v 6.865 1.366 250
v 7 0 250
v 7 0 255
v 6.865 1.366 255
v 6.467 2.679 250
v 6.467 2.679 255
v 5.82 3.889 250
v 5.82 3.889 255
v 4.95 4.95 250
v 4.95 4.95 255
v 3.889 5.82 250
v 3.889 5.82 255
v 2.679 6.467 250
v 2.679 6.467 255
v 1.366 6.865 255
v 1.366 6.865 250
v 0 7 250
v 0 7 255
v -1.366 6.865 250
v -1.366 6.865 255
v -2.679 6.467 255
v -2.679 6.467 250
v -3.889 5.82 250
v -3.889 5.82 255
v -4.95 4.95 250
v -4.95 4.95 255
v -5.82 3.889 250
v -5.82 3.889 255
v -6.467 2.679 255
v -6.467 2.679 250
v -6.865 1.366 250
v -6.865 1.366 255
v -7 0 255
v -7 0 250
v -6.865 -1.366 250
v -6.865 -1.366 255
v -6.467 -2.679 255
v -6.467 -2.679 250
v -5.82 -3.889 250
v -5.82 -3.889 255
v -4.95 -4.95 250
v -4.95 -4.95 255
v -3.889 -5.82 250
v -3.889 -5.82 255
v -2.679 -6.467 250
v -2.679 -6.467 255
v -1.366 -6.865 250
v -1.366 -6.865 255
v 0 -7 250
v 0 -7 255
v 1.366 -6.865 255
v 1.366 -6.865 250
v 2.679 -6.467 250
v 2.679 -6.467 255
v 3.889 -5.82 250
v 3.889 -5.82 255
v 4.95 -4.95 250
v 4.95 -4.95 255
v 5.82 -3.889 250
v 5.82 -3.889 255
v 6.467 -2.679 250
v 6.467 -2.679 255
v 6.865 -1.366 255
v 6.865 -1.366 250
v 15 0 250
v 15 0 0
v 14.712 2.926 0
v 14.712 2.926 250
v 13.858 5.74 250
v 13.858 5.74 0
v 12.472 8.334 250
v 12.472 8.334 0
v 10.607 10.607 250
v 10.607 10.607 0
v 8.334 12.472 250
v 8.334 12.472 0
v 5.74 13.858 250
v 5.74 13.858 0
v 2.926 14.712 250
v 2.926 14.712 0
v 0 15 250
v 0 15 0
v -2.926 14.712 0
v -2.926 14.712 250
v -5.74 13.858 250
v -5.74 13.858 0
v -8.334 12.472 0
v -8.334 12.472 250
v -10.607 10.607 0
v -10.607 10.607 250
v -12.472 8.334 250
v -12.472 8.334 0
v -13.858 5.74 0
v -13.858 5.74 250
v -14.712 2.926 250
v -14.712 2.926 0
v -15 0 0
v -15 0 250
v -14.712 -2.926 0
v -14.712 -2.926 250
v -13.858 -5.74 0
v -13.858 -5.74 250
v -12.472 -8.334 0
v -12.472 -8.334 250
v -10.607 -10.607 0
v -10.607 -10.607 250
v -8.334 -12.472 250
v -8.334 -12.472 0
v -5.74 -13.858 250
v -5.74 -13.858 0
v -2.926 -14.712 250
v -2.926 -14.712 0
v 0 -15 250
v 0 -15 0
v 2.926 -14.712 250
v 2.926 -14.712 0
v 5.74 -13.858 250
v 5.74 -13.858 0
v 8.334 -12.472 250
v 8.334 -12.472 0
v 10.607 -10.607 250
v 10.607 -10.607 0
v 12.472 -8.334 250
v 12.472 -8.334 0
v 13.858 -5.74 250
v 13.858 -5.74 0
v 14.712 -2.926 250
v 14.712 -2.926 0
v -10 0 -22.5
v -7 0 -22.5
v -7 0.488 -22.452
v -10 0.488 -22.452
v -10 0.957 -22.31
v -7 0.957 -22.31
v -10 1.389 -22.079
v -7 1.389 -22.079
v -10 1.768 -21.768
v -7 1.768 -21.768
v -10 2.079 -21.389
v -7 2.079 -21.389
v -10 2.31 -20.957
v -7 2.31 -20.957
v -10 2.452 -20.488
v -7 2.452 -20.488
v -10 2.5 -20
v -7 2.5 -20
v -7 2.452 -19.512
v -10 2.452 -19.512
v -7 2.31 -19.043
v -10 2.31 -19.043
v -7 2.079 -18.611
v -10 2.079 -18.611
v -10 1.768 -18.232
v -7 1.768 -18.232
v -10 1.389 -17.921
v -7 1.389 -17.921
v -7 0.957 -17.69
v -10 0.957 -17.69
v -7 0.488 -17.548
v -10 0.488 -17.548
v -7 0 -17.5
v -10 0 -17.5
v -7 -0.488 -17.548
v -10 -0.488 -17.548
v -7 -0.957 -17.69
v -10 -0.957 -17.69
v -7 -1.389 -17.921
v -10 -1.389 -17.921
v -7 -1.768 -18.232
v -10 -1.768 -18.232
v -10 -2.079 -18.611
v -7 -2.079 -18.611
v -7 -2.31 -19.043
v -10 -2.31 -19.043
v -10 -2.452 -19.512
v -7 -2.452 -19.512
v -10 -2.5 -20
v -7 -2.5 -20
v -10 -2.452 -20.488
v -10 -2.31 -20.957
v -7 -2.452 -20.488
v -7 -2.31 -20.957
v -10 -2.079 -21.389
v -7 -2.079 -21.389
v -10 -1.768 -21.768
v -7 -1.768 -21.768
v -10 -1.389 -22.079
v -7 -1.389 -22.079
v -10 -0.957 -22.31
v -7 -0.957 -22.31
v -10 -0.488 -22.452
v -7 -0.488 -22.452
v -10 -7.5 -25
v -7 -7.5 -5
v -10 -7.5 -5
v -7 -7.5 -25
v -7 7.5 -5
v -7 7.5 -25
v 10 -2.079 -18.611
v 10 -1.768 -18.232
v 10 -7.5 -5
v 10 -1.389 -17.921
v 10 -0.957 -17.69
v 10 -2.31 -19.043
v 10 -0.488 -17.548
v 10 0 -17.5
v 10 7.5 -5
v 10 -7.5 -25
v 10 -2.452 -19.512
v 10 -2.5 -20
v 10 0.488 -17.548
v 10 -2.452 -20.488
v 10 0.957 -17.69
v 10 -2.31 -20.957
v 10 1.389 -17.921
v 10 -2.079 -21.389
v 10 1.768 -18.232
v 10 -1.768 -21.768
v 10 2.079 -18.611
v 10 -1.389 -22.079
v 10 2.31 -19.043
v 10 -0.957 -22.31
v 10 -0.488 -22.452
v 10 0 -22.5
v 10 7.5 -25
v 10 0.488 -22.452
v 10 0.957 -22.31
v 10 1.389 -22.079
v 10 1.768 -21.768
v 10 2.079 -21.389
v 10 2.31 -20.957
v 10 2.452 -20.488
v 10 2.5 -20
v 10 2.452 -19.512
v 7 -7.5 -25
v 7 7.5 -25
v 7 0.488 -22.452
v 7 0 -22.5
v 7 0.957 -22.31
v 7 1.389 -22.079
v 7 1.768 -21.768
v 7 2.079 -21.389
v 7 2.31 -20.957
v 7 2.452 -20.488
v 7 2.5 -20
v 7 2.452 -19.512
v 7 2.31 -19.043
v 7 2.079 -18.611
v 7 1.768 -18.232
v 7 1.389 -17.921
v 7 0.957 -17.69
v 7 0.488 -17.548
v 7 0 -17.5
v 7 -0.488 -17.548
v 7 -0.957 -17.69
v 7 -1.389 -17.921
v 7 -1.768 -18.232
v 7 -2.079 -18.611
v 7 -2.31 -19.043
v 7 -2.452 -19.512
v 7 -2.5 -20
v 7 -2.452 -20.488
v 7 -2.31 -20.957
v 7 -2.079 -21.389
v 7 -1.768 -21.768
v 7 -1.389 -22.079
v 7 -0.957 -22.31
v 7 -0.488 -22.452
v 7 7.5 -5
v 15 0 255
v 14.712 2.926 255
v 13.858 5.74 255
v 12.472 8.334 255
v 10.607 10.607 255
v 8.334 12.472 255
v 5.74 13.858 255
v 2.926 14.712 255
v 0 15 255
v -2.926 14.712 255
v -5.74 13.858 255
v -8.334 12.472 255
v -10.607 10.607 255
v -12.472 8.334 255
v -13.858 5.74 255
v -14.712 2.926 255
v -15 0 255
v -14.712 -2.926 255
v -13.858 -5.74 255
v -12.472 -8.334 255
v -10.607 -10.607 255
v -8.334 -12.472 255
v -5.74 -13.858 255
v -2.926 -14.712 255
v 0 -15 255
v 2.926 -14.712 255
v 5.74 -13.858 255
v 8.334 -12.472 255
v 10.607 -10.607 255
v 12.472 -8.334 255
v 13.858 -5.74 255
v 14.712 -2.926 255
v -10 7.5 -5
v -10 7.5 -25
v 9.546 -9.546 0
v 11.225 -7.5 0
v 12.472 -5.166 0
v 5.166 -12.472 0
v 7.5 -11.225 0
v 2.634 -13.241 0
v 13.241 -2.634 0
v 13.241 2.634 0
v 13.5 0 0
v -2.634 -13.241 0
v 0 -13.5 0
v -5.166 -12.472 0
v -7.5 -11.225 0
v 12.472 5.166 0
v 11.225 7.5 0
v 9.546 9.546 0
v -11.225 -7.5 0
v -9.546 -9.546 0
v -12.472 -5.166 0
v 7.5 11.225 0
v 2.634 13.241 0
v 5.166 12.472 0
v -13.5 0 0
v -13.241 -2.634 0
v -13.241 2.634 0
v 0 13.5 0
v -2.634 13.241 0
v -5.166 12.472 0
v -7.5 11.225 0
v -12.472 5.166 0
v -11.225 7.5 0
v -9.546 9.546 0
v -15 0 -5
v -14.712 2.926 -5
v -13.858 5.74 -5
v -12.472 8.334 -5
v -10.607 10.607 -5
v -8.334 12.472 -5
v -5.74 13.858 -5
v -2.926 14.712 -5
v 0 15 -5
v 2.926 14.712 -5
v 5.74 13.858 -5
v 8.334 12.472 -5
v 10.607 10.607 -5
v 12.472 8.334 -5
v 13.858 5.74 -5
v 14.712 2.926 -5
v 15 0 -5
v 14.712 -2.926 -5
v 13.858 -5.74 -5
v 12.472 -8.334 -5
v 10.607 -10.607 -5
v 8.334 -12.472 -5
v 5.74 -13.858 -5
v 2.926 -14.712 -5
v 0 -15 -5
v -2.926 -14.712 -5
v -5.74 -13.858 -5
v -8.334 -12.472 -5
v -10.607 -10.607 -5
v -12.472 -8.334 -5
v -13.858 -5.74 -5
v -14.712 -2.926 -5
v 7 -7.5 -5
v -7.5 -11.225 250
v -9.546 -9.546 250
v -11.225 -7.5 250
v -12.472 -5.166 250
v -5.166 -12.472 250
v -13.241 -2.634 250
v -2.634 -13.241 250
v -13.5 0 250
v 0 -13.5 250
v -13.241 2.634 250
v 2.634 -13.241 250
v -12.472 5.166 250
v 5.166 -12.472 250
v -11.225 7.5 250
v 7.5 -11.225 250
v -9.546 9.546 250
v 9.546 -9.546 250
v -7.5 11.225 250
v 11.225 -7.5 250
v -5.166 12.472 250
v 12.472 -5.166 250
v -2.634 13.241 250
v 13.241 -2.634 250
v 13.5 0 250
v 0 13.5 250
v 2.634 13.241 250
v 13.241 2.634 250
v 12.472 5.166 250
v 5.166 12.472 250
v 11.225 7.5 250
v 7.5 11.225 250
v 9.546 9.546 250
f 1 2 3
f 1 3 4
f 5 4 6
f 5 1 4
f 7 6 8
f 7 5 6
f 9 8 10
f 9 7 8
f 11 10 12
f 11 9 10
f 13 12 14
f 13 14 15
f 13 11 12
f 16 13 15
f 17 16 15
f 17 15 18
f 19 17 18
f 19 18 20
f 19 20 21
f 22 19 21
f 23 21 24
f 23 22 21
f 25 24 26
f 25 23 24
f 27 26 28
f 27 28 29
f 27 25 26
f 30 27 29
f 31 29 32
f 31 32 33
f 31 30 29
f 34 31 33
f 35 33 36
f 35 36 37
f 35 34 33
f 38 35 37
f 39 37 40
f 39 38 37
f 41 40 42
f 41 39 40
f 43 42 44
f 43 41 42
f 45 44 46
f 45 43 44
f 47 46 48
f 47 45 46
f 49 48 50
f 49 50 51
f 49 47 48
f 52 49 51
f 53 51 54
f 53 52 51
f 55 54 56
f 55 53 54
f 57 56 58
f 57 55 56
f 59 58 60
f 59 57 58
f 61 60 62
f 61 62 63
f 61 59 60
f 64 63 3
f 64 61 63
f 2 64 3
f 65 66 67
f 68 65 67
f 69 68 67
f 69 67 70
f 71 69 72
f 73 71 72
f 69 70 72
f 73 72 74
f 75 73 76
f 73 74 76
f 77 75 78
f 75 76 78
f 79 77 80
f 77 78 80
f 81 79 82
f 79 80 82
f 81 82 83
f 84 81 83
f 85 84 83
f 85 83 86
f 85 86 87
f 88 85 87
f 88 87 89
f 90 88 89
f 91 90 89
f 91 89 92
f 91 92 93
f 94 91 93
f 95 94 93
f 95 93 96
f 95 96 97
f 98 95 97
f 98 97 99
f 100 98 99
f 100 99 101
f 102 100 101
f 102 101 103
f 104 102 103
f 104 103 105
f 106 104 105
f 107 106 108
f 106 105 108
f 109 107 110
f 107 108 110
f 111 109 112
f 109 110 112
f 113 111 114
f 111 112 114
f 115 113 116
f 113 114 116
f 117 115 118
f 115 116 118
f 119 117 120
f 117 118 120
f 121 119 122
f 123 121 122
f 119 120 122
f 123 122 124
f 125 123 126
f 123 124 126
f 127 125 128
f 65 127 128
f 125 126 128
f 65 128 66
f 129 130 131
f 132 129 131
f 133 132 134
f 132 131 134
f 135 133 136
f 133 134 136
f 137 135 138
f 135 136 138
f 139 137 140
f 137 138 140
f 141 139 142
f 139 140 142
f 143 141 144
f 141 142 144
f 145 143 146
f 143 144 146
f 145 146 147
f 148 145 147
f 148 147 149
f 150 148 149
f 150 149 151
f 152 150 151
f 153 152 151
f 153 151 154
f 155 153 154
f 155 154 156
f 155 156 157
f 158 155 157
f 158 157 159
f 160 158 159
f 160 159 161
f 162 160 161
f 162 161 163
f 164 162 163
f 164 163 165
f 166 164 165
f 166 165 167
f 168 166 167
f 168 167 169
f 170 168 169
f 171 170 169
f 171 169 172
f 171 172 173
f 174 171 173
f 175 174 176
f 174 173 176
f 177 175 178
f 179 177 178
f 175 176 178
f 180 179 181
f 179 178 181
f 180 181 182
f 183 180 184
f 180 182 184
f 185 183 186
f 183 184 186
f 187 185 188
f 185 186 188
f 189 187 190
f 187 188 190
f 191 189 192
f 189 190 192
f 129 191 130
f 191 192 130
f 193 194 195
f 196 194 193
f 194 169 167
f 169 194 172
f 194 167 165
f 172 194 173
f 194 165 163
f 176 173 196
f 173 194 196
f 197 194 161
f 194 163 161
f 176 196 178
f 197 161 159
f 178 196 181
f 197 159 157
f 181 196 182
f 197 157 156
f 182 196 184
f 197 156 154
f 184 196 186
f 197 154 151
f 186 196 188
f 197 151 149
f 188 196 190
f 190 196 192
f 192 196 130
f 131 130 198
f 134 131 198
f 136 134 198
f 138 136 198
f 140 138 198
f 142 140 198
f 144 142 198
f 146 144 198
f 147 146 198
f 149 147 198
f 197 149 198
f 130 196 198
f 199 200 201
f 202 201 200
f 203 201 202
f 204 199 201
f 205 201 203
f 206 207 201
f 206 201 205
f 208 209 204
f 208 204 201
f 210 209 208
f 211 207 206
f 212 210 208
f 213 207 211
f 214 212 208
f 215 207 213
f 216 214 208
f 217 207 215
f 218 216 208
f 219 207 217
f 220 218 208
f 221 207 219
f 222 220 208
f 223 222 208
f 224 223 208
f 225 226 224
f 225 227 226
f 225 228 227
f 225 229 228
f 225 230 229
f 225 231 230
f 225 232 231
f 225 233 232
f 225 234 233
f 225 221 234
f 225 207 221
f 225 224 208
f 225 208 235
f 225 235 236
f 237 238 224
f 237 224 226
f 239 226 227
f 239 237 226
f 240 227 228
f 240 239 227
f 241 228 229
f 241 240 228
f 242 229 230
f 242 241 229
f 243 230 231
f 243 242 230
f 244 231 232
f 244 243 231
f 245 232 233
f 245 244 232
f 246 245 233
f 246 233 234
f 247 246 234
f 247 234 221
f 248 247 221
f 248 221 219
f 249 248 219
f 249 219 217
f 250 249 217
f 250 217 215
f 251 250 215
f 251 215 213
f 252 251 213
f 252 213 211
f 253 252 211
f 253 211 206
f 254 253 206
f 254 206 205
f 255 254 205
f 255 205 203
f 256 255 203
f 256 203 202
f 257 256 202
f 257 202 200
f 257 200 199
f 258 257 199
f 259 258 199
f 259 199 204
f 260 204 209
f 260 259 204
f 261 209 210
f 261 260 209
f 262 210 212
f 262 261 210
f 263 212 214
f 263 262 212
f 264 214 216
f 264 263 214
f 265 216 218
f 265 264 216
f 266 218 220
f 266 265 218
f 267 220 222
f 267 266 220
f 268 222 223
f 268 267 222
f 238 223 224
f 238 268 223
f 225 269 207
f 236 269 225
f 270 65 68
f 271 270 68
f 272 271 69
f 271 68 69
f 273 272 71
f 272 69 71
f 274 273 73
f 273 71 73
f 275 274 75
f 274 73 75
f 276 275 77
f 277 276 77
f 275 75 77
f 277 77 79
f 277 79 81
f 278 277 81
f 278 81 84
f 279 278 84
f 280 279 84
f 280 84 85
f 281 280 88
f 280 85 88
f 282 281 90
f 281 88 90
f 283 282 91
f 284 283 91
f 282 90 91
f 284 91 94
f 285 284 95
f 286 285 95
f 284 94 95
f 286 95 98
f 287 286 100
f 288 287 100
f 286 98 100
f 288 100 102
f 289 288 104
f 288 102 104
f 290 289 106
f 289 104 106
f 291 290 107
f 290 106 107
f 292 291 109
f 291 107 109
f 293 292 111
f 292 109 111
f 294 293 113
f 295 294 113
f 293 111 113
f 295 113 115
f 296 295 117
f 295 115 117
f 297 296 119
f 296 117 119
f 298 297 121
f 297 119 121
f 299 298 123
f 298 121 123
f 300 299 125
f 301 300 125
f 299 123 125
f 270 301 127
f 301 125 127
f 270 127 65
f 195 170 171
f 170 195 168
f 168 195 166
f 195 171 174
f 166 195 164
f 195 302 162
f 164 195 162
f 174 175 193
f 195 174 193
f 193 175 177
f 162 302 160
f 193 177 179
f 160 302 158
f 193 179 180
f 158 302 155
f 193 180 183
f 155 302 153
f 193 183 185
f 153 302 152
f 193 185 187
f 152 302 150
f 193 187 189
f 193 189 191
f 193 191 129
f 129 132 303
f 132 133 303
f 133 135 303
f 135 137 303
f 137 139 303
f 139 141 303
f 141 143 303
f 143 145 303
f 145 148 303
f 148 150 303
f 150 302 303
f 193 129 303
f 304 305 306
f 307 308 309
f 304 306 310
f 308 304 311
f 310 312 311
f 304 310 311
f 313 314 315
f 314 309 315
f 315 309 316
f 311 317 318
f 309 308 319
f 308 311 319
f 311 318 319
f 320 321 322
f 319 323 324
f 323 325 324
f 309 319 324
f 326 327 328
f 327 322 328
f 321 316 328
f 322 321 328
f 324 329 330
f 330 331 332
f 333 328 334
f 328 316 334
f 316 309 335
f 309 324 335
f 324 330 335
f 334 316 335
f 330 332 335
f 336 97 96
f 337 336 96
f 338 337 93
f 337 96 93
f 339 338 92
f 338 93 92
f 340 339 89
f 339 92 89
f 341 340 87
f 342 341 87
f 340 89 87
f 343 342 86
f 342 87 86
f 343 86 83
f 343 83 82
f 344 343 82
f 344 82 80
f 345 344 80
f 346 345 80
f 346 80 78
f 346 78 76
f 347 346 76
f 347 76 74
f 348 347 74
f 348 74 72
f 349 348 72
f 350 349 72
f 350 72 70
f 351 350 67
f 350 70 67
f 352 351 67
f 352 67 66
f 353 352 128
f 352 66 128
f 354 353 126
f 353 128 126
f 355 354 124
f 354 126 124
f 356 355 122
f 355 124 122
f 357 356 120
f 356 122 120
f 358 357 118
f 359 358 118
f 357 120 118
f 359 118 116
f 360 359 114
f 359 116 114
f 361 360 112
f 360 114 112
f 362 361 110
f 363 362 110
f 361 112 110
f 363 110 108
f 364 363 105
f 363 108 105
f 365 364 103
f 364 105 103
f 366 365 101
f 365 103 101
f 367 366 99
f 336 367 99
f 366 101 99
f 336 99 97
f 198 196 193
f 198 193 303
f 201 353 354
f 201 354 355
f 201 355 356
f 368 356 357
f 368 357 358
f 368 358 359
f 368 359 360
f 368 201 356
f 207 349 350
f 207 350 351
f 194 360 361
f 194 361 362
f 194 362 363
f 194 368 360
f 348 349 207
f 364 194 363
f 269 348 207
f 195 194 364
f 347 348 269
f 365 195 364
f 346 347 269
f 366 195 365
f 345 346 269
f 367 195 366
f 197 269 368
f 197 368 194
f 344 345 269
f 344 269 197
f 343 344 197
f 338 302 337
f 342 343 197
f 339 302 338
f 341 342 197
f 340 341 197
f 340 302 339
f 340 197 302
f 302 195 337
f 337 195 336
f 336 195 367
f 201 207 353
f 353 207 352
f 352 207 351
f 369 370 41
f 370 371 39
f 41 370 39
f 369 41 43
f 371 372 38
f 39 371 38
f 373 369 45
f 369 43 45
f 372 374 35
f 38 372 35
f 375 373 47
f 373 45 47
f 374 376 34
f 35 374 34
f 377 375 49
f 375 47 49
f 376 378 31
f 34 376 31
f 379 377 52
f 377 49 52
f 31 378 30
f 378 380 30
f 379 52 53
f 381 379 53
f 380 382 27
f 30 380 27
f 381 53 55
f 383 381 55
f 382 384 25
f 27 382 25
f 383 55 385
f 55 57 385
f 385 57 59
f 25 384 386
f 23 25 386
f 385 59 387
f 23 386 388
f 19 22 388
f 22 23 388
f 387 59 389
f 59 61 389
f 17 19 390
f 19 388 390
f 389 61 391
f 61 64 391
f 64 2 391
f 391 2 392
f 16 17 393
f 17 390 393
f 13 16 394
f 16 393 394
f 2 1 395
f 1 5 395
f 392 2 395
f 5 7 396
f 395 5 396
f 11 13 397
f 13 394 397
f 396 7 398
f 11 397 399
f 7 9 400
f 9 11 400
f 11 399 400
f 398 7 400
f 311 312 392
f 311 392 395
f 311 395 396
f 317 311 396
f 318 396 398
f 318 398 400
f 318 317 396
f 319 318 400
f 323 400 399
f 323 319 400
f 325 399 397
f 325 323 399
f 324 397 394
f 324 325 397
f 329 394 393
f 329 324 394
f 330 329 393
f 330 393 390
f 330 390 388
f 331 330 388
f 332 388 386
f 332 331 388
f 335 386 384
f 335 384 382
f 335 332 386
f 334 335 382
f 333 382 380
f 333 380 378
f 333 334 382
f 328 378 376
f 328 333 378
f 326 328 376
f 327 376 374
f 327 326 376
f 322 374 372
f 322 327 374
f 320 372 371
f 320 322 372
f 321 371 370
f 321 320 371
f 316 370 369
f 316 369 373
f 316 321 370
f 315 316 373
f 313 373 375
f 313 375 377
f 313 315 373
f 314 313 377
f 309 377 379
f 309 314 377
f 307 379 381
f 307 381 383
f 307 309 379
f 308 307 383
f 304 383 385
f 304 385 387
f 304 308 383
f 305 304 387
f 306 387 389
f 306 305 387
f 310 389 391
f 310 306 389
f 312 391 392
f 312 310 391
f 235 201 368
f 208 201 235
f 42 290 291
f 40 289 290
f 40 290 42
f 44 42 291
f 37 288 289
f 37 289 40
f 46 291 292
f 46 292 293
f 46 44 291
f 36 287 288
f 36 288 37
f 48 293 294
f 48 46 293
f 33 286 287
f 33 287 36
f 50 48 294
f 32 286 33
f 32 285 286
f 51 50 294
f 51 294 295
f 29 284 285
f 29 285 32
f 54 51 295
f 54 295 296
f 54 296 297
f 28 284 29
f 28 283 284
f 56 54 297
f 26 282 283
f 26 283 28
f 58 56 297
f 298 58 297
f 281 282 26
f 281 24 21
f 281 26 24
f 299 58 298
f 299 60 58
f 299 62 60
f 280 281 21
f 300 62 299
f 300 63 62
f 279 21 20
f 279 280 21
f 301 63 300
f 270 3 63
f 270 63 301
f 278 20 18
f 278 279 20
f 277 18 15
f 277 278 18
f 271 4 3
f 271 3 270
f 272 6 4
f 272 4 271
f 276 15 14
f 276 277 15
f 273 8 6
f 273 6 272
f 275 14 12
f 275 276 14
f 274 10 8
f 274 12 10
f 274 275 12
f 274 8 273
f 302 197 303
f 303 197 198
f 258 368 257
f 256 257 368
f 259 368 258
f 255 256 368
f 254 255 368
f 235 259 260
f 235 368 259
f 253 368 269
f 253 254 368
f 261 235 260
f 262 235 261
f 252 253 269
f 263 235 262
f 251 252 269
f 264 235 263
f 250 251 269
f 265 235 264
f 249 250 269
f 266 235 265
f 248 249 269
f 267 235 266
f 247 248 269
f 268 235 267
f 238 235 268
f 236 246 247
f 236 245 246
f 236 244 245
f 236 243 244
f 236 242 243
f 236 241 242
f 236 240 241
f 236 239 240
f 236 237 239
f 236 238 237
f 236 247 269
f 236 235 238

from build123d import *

# Parameters (mm, degrees)
SKETCH1_R                = 15
SKETCH1_R_2              = 13.5
BOSS_EXTRUDE1_DEPTH      = 250
SKETCH2_R                = 15
BOSS_EXTRUDE2_DEPTH      = 5
SKETCH3_R                = 15
SKETCH3_R_2              = 7
BOSS_EXTRUDE3_DEPTH      = 5
SKETCH4_W                = 20
SKETCH4_H                = 15
SKETCH4_R                = 2.5
BOSS_EXTRUDE4_DEPTH      = 10
BOSS_EXTRUDE4_DEPTH_BACK = 10
SKETCH5_W                = 14
SKETCH5_H                = 15
CUT_EXTRUDE1_DEPTH       = 20


with BuildPart() as part:
    # Sketch1 → Boss-Extrude1 (new body)
    with BuildSketch(Plane.XY):
        Circle(SKETCH1_R)
        Circle(SKETCH1_R_2, mode=Mode.SUBTRACT)
    extrude(amount=BOSS_EXTRUDE1_DEPTH)

    # Sketch2 → Boss-Extrude2 (add)
    with BuildSketch(Plane(origin=(0, 0, 0), x_dir=(-1, 0, 0), z_dir=(0, 0, -1))):
        Circle(SKETCH2_R)
    extrude(amount=BOSS_EXTRUDE2_DEPTH)

    # Sketch3 → Boss-Extrude3 (add)
    with BuildSketch(Plane.XY.offset(250)):
        Circle(SKETCH3_R)
        Circle(SKETCH3_R_2, mode=Mode.SUBTRACT)
    extrude(amount=BOSS_EXTRUDE3_DEPTH)

    # Sketch4 → Boss-Extrude4 (add, two sides)
    with BuildSketch(Plane(origin=(0, 0, 0), x_dir=(0, 0, -1), z_dir=(1, 0, 0))) as boss_extrude4_sk:
        with Locations((15, 0)):
            Rectangle(SKETCH4_W, SKETCH4_H)
        with Locations((20, 0)):
            Circle(SKETCH4_R, mode=Mode.SUBTRACT)
    extrude(amount=BOSS_EXTRUDE4_DEPTH)
    extrude(boss_extrude4_sk.sketch, amount=-BOSS_EXTRUDE4_DEPTH_BACK)

    # Sketch5 → Cut-Extrude1 (cut)
    with BuildSketch(Plane(origin=(0, 0, -25), x_dir=(-1, 0, 0), z_dir=(0, 0, -1))):
        Rectangle(SKETCH5_W, SKETCH5_H)
    extrude(amount=-CUT_EXTRUDE1_DEPTH, mode=Mode.SUBTRACT)


solid = part.part
